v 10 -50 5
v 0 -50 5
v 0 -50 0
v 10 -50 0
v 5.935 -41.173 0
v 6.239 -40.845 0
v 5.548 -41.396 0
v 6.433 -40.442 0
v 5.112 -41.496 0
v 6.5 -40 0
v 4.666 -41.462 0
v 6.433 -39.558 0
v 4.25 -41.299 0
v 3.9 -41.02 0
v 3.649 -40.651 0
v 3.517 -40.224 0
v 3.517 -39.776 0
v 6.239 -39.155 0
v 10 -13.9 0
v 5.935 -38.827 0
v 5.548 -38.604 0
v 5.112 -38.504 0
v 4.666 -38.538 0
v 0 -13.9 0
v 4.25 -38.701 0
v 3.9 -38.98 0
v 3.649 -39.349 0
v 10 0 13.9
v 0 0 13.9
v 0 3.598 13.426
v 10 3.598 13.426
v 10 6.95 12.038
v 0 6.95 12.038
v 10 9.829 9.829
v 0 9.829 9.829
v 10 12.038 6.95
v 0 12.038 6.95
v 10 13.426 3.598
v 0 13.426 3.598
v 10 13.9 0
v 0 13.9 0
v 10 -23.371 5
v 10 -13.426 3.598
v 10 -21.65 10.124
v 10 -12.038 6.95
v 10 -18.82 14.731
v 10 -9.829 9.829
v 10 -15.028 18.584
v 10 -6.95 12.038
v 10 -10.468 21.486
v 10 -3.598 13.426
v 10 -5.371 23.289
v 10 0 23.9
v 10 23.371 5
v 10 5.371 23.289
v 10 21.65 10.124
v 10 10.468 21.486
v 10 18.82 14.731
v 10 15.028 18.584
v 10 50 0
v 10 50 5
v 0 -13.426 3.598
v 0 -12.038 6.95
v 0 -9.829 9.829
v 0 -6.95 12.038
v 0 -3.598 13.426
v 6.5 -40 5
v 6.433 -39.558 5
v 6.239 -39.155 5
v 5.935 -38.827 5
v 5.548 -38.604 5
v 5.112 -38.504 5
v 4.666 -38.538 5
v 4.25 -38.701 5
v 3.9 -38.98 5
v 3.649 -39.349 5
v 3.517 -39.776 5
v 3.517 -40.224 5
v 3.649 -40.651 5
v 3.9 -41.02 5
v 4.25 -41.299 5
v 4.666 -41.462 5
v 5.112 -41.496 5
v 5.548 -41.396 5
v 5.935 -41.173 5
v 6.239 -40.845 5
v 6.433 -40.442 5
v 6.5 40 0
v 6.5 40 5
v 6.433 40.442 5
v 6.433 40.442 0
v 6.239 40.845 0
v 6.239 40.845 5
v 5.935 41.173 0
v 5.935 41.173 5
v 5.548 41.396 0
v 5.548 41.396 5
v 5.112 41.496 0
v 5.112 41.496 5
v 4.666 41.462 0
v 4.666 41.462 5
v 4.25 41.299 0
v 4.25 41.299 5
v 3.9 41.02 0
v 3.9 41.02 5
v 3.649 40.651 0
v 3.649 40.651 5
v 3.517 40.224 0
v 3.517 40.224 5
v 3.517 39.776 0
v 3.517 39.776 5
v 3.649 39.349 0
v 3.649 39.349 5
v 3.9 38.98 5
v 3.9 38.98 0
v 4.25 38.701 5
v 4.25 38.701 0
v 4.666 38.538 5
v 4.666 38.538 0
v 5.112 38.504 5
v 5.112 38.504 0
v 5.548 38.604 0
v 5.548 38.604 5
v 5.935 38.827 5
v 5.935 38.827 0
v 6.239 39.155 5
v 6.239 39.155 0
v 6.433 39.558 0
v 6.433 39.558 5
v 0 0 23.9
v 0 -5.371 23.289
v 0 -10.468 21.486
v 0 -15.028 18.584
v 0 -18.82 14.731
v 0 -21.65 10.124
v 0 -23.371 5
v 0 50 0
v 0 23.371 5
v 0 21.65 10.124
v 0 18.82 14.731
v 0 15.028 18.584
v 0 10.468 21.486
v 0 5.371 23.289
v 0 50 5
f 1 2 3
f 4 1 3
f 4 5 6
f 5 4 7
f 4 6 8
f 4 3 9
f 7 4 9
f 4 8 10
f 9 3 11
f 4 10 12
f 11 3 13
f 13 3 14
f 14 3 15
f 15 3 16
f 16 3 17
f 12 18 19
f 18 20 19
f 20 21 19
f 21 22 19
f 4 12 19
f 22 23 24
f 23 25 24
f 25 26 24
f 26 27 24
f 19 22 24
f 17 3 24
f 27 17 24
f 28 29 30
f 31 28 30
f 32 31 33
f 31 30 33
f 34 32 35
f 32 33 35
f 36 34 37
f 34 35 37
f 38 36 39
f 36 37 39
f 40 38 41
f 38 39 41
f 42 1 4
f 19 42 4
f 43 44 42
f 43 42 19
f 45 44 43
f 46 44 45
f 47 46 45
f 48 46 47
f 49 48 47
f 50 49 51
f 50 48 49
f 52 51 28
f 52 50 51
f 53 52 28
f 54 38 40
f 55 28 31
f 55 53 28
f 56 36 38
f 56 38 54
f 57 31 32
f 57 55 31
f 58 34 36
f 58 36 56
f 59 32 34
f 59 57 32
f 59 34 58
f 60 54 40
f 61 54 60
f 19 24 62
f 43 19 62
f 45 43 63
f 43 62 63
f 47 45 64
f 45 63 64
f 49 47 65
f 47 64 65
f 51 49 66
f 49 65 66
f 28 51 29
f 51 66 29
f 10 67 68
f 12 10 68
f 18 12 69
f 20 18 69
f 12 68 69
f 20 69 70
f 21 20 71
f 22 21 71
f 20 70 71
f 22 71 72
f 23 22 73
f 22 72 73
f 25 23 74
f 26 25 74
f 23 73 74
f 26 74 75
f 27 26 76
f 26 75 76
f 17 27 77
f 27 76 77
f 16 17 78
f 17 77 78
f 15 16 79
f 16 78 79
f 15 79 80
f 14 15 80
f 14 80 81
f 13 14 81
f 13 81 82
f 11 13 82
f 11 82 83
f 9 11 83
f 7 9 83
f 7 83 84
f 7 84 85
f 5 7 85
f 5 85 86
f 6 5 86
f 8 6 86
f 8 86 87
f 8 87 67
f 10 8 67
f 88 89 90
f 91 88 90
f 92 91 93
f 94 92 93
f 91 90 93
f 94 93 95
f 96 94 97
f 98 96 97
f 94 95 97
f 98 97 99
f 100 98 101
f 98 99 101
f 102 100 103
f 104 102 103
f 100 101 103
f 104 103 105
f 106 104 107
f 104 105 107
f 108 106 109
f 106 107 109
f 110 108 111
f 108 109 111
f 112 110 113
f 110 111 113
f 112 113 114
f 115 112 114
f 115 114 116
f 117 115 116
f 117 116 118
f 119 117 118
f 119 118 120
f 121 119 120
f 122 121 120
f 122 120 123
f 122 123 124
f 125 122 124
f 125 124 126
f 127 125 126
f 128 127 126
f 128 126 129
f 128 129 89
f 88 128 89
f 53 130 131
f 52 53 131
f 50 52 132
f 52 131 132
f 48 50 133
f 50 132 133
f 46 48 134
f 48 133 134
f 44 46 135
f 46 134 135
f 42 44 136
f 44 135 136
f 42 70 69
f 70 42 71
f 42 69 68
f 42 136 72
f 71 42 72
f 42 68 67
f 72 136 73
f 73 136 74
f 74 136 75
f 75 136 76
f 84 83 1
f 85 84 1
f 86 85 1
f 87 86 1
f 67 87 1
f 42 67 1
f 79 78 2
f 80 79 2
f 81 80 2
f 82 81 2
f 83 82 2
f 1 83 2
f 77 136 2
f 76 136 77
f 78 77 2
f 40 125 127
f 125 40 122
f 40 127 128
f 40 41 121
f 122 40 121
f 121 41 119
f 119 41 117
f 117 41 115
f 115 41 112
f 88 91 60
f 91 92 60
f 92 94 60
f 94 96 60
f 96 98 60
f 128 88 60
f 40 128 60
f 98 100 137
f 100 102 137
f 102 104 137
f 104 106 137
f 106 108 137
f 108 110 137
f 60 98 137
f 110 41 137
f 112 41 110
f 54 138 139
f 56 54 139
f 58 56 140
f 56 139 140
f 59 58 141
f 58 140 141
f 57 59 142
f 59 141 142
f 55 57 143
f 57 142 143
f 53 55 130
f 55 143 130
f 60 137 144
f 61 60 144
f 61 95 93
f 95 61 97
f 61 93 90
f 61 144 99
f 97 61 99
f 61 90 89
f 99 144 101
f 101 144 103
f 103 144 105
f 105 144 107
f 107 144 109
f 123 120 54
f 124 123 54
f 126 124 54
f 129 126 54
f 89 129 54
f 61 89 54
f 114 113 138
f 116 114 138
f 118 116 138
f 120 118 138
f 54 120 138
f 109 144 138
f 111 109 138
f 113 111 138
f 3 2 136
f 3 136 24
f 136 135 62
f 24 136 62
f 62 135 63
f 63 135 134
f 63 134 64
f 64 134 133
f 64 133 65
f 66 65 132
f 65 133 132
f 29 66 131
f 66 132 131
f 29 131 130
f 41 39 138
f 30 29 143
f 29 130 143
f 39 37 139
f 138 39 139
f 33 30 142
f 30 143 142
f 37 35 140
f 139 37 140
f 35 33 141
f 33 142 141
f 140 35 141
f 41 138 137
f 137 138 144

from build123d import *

# Parameters (mm, degrees)
F1_DEPTH = 10
F2_R     = 1.5
F3_DEPTH = 25


with BuildPart() as f1:
    # F0 (on Right) → F1 (new body)
    with BuildSketch(Plane.YZ):
        with BuildLine():
            ThreePointArc((-13.9, 0), (-9.828784, 9.828784), (0, 13.9))
            ThreePointArc((0, 13.9), (9.828784, 9.828784), (13.9, 0))
            Line((13.9, 0), (50, 0))
            Line((50, 0), (50, 5))
            Line((50, 5), (23.371136, 5))
            ThreePointArc((23.371136, 5), (15.028473, 18.583729), (0, 23.9))
            ThreePointArc((0, 23.9), (-15.028473, 18.583729), (-23.371136, 5))
            Line((-23.371136, 5), (-50, 5))
            Line((-50, 5), (-50, 0))
            Line((-50, 0), (-13.9, 0))
        make_face()
    extrude(amount=F1_DEPTH)

    # F2 (on face) → F3 (cut)
    with BuildSketch(Plane.XY.offset(5)):
        with Locations((5, 40)):
            Circle(F2_R)
        with Locations((5, -40)):
            Circle(F2_R)
    extrude(amount=-F3_DEPTH, mode=Mode.SUBTRACT)


solid = f1.part
